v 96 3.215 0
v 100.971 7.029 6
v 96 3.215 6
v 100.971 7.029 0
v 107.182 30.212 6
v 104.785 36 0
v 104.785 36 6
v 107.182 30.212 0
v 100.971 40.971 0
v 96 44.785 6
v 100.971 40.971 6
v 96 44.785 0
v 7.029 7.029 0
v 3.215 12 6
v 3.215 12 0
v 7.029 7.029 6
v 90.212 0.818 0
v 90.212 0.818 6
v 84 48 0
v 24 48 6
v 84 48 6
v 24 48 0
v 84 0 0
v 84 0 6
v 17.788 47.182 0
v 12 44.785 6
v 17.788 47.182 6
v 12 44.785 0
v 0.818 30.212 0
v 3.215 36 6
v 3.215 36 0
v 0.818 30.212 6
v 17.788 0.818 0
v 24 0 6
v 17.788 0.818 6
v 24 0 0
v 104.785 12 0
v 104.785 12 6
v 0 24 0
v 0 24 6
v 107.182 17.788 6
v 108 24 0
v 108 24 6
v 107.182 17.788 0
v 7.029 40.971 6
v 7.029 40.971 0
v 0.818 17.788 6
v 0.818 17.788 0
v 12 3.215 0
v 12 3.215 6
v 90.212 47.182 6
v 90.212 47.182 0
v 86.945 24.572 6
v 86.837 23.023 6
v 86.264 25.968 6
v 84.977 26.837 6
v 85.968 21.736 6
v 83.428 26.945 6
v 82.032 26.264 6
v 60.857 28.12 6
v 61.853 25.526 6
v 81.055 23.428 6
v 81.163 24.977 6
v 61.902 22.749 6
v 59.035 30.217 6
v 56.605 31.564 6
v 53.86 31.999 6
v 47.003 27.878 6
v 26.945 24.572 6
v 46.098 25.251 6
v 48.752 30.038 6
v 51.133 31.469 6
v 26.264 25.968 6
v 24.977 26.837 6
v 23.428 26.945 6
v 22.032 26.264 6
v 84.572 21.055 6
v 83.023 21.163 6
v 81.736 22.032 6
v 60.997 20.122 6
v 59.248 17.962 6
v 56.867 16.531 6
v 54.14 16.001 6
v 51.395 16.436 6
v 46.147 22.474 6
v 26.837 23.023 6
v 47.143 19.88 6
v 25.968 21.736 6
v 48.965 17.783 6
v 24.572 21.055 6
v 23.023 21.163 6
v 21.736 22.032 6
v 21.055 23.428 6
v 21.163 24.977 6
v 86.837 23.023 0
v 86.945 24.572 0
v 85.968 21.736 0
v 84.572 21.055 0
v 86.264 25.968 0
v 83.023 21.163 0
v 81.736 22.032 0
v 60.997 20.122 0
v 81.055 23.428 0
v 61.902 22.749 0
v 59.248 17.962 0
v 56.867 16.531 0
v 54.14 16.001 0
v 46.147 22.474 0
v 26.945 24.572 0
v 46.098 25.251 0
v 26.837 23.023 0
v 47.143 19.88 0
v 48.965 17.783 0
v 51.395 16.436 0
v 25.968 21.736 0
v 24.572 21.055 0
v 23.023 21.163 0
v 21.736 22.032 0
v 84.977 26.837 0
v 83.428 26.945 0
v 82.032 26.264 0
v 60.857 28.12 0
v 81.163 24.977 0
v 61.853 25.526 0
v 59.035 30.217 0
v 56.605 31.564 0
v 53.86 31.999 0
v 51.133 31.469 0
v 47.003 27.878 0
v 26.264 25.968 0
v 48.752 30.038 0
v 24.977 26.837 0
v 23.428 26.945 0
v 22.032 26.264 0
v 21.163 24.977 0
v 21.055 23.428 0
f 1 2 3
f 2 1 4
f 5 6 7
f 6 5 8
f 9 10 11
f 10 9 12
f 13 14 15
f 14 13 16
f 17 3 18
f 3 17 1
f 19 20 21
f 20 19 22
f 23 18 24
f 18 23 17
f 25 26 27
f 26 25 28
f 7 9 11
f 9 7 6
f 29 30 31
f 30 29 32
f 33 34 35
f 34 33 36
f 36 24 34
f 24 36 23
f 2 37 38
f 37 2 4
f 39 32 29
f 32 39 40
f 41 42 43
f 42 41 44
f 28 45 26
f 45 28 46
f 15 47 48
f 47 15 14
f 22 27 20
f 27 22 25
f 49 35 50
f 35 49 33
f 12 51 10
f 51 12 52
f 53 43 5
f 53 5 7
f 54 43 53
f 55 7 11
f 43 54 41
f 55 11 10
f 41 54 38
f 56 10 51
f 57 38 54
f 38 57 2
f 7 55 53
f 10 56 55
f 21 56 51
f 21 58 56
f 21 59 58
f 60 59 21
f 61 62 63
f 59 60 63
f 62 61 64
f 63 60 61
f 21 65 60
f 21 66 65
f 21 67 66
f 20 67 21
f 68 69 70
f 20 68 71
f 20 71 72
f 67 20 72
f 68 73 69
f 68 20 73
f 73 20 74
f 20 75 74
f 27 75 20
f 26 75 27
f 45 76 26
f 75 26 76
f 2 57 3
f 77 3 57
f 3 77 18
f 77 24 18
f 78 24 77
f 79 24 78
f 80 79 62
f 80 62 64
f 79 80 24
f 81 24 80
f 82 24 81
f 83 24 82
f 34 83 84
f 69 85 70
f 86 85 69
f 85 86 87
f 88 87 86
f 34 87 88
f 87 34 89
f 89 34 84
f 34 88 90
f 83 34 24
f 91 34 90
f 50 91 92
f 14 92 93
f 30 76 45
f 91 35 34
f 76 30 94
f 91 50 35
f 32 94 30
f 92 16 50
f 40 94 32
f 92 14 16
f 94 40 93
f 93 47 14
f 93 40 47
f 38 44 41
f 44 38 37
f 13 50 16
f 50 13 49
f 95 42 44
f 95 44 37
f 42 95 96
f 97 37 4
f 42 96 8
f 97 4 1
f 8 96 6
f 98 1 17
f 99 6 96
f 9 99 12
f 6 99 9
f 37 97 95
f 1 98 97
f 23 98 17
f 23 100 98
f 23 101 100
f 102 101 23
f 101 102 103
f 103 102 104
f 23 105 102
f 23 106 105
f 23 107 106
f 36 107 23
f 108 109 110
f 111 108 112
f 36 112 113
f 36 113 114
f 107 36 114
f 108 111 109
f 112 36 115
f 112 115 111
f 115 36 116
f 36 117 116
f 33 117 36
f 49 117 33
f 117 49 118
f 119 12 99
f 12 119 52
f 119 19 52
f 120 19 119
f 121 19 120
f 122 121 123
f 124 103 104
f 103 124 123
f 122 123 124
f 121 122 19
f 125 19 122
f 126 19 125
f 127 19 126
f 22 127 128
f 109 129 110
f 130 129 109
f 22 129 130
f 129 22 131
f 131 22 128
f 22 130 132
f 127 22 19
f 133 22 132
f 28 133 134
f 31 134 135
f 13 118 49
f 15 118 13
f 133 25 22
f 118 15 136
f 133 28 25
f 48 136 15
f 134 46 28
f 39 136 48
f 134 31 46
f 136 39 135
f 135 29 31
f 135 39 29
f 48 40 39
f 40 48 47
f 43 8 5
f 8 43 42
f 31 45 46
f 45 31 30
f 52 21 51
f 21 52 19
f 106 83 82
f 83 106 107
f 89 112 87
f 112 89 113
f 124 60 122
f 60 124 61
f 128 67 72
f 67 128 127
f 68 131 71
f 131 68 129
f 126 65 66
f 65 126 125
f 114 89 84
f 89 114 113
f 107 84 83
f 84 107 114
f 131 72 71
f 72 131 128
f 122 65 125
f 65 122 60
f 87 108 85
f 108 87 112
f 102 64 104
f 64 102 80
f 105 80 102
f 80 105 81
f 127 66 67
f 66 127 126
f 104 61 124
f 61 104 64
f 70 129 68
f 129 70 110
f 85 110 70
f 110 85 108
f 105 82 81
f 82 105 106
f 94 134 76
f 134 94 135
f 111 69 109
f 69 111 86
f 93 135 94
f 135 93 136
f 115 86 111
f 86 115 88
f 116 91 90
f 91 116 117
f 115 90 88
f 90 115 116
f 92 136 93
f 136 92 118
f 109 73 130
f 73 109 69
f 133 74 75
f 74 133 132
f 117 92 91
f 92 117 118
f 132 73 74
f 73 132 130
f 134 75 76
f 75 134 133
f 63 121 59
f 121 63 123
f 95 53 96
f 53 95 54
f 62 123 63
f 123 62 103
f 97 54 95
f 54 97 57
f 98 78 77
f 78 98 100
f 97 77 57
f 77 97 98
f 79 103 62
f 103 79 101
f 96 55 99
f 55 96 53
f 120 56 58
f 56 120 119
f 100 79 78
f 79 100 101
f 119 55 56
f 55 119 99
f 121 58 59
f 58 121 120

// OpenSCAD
$fn = 32;

// ----------------------------------------------------------------------
// Spacer plate: obround span 60, caps R24
// ----------------------------------------------------------------------

// --- parameters (mm) ---
bore_r = 8;               // centre bore radius
bolt_r = 3;               // bolt hole radius
plate_t = 6;              // plate thickness, Z (extrusion height)
span = 60;                // obround span
cap_r = 24;               // cap radius

profile = [[24, 48], [17.788, 47.182], [12, 44.785], [7.029, 40.971], [3.215, 36], [0.818, 30.212], [0, 24], [0.818, 17.788], [3.215, 12], [7.029, 7.029], [12, 3.215], [17.788, 0.818], [24, 0], [84, 0], [90.212, 0.818], [96, 3.215], [100.971, 7.029], [104.785, 12], [107.182, 17.788], [108, 24], [107.182, 30.212], [104.785, 36], [100.971, 40.971], [96, 44.785], [90.212, 47.182], [84, 48]];  // primary outline, 26 points, counter clockwise
void_1 = [[61.853, 25.526], [60.857, 28.12], [59.035, 30.217], [56.605, 31.564], [53.86, 31.999], [51.133, 31.469], [48.752, 30.038], [47.003, 27.878], [46.098, 25.251], [46.147, 22.474], [47.143, 19.88], [48.965, 17.783], [51.395, 16.436], [54.14, 16.001], [56.867, 16.531], [59.248, 17.962], [60.997, 20.122], [61.902, 22.749]];  // centre bore, 18 points
void_2 = [[26.945, 24.572], [26.264, 25.968], [24.977, 26.837], [23.428, 26.945], [22.032, 26.264], [21.163, 24.977], [21.055, 23.428], [21.736, 22.032], [23.023, 21.163], [24.572, 21.055], [25.968, 21.736], [26.837, 23.023]];  // end hole, 12 points
void_3 = [[86.945, 24.572], [86.264, 25.968], [84.977, 26.837], [83.428, 26.945], [82.032, 26.264], [81.163, 24.977], [81.055, 23.428], [81.736, 22.032], [83.023, 21.163], [84.572, 21.055], [85.968, 21.736], [86.837, 23.023]];  // end hole, 12 points

// --- the one profile operation ---
difference() {
  linear_extrude(height = plate_t) polygon(points = profile);
  translate([0, 0, -1])
    linear_extrude(height = plate_t + 2) polygon(points = void_1);
  translate([0, 0, -1])
    linear_extrude(height = plate_t + 2) polygon(points = void_2);
  translate([0, 0, -1])
    linear_extrude(height = plate_t + 2) polygon(points = void_3);
}
